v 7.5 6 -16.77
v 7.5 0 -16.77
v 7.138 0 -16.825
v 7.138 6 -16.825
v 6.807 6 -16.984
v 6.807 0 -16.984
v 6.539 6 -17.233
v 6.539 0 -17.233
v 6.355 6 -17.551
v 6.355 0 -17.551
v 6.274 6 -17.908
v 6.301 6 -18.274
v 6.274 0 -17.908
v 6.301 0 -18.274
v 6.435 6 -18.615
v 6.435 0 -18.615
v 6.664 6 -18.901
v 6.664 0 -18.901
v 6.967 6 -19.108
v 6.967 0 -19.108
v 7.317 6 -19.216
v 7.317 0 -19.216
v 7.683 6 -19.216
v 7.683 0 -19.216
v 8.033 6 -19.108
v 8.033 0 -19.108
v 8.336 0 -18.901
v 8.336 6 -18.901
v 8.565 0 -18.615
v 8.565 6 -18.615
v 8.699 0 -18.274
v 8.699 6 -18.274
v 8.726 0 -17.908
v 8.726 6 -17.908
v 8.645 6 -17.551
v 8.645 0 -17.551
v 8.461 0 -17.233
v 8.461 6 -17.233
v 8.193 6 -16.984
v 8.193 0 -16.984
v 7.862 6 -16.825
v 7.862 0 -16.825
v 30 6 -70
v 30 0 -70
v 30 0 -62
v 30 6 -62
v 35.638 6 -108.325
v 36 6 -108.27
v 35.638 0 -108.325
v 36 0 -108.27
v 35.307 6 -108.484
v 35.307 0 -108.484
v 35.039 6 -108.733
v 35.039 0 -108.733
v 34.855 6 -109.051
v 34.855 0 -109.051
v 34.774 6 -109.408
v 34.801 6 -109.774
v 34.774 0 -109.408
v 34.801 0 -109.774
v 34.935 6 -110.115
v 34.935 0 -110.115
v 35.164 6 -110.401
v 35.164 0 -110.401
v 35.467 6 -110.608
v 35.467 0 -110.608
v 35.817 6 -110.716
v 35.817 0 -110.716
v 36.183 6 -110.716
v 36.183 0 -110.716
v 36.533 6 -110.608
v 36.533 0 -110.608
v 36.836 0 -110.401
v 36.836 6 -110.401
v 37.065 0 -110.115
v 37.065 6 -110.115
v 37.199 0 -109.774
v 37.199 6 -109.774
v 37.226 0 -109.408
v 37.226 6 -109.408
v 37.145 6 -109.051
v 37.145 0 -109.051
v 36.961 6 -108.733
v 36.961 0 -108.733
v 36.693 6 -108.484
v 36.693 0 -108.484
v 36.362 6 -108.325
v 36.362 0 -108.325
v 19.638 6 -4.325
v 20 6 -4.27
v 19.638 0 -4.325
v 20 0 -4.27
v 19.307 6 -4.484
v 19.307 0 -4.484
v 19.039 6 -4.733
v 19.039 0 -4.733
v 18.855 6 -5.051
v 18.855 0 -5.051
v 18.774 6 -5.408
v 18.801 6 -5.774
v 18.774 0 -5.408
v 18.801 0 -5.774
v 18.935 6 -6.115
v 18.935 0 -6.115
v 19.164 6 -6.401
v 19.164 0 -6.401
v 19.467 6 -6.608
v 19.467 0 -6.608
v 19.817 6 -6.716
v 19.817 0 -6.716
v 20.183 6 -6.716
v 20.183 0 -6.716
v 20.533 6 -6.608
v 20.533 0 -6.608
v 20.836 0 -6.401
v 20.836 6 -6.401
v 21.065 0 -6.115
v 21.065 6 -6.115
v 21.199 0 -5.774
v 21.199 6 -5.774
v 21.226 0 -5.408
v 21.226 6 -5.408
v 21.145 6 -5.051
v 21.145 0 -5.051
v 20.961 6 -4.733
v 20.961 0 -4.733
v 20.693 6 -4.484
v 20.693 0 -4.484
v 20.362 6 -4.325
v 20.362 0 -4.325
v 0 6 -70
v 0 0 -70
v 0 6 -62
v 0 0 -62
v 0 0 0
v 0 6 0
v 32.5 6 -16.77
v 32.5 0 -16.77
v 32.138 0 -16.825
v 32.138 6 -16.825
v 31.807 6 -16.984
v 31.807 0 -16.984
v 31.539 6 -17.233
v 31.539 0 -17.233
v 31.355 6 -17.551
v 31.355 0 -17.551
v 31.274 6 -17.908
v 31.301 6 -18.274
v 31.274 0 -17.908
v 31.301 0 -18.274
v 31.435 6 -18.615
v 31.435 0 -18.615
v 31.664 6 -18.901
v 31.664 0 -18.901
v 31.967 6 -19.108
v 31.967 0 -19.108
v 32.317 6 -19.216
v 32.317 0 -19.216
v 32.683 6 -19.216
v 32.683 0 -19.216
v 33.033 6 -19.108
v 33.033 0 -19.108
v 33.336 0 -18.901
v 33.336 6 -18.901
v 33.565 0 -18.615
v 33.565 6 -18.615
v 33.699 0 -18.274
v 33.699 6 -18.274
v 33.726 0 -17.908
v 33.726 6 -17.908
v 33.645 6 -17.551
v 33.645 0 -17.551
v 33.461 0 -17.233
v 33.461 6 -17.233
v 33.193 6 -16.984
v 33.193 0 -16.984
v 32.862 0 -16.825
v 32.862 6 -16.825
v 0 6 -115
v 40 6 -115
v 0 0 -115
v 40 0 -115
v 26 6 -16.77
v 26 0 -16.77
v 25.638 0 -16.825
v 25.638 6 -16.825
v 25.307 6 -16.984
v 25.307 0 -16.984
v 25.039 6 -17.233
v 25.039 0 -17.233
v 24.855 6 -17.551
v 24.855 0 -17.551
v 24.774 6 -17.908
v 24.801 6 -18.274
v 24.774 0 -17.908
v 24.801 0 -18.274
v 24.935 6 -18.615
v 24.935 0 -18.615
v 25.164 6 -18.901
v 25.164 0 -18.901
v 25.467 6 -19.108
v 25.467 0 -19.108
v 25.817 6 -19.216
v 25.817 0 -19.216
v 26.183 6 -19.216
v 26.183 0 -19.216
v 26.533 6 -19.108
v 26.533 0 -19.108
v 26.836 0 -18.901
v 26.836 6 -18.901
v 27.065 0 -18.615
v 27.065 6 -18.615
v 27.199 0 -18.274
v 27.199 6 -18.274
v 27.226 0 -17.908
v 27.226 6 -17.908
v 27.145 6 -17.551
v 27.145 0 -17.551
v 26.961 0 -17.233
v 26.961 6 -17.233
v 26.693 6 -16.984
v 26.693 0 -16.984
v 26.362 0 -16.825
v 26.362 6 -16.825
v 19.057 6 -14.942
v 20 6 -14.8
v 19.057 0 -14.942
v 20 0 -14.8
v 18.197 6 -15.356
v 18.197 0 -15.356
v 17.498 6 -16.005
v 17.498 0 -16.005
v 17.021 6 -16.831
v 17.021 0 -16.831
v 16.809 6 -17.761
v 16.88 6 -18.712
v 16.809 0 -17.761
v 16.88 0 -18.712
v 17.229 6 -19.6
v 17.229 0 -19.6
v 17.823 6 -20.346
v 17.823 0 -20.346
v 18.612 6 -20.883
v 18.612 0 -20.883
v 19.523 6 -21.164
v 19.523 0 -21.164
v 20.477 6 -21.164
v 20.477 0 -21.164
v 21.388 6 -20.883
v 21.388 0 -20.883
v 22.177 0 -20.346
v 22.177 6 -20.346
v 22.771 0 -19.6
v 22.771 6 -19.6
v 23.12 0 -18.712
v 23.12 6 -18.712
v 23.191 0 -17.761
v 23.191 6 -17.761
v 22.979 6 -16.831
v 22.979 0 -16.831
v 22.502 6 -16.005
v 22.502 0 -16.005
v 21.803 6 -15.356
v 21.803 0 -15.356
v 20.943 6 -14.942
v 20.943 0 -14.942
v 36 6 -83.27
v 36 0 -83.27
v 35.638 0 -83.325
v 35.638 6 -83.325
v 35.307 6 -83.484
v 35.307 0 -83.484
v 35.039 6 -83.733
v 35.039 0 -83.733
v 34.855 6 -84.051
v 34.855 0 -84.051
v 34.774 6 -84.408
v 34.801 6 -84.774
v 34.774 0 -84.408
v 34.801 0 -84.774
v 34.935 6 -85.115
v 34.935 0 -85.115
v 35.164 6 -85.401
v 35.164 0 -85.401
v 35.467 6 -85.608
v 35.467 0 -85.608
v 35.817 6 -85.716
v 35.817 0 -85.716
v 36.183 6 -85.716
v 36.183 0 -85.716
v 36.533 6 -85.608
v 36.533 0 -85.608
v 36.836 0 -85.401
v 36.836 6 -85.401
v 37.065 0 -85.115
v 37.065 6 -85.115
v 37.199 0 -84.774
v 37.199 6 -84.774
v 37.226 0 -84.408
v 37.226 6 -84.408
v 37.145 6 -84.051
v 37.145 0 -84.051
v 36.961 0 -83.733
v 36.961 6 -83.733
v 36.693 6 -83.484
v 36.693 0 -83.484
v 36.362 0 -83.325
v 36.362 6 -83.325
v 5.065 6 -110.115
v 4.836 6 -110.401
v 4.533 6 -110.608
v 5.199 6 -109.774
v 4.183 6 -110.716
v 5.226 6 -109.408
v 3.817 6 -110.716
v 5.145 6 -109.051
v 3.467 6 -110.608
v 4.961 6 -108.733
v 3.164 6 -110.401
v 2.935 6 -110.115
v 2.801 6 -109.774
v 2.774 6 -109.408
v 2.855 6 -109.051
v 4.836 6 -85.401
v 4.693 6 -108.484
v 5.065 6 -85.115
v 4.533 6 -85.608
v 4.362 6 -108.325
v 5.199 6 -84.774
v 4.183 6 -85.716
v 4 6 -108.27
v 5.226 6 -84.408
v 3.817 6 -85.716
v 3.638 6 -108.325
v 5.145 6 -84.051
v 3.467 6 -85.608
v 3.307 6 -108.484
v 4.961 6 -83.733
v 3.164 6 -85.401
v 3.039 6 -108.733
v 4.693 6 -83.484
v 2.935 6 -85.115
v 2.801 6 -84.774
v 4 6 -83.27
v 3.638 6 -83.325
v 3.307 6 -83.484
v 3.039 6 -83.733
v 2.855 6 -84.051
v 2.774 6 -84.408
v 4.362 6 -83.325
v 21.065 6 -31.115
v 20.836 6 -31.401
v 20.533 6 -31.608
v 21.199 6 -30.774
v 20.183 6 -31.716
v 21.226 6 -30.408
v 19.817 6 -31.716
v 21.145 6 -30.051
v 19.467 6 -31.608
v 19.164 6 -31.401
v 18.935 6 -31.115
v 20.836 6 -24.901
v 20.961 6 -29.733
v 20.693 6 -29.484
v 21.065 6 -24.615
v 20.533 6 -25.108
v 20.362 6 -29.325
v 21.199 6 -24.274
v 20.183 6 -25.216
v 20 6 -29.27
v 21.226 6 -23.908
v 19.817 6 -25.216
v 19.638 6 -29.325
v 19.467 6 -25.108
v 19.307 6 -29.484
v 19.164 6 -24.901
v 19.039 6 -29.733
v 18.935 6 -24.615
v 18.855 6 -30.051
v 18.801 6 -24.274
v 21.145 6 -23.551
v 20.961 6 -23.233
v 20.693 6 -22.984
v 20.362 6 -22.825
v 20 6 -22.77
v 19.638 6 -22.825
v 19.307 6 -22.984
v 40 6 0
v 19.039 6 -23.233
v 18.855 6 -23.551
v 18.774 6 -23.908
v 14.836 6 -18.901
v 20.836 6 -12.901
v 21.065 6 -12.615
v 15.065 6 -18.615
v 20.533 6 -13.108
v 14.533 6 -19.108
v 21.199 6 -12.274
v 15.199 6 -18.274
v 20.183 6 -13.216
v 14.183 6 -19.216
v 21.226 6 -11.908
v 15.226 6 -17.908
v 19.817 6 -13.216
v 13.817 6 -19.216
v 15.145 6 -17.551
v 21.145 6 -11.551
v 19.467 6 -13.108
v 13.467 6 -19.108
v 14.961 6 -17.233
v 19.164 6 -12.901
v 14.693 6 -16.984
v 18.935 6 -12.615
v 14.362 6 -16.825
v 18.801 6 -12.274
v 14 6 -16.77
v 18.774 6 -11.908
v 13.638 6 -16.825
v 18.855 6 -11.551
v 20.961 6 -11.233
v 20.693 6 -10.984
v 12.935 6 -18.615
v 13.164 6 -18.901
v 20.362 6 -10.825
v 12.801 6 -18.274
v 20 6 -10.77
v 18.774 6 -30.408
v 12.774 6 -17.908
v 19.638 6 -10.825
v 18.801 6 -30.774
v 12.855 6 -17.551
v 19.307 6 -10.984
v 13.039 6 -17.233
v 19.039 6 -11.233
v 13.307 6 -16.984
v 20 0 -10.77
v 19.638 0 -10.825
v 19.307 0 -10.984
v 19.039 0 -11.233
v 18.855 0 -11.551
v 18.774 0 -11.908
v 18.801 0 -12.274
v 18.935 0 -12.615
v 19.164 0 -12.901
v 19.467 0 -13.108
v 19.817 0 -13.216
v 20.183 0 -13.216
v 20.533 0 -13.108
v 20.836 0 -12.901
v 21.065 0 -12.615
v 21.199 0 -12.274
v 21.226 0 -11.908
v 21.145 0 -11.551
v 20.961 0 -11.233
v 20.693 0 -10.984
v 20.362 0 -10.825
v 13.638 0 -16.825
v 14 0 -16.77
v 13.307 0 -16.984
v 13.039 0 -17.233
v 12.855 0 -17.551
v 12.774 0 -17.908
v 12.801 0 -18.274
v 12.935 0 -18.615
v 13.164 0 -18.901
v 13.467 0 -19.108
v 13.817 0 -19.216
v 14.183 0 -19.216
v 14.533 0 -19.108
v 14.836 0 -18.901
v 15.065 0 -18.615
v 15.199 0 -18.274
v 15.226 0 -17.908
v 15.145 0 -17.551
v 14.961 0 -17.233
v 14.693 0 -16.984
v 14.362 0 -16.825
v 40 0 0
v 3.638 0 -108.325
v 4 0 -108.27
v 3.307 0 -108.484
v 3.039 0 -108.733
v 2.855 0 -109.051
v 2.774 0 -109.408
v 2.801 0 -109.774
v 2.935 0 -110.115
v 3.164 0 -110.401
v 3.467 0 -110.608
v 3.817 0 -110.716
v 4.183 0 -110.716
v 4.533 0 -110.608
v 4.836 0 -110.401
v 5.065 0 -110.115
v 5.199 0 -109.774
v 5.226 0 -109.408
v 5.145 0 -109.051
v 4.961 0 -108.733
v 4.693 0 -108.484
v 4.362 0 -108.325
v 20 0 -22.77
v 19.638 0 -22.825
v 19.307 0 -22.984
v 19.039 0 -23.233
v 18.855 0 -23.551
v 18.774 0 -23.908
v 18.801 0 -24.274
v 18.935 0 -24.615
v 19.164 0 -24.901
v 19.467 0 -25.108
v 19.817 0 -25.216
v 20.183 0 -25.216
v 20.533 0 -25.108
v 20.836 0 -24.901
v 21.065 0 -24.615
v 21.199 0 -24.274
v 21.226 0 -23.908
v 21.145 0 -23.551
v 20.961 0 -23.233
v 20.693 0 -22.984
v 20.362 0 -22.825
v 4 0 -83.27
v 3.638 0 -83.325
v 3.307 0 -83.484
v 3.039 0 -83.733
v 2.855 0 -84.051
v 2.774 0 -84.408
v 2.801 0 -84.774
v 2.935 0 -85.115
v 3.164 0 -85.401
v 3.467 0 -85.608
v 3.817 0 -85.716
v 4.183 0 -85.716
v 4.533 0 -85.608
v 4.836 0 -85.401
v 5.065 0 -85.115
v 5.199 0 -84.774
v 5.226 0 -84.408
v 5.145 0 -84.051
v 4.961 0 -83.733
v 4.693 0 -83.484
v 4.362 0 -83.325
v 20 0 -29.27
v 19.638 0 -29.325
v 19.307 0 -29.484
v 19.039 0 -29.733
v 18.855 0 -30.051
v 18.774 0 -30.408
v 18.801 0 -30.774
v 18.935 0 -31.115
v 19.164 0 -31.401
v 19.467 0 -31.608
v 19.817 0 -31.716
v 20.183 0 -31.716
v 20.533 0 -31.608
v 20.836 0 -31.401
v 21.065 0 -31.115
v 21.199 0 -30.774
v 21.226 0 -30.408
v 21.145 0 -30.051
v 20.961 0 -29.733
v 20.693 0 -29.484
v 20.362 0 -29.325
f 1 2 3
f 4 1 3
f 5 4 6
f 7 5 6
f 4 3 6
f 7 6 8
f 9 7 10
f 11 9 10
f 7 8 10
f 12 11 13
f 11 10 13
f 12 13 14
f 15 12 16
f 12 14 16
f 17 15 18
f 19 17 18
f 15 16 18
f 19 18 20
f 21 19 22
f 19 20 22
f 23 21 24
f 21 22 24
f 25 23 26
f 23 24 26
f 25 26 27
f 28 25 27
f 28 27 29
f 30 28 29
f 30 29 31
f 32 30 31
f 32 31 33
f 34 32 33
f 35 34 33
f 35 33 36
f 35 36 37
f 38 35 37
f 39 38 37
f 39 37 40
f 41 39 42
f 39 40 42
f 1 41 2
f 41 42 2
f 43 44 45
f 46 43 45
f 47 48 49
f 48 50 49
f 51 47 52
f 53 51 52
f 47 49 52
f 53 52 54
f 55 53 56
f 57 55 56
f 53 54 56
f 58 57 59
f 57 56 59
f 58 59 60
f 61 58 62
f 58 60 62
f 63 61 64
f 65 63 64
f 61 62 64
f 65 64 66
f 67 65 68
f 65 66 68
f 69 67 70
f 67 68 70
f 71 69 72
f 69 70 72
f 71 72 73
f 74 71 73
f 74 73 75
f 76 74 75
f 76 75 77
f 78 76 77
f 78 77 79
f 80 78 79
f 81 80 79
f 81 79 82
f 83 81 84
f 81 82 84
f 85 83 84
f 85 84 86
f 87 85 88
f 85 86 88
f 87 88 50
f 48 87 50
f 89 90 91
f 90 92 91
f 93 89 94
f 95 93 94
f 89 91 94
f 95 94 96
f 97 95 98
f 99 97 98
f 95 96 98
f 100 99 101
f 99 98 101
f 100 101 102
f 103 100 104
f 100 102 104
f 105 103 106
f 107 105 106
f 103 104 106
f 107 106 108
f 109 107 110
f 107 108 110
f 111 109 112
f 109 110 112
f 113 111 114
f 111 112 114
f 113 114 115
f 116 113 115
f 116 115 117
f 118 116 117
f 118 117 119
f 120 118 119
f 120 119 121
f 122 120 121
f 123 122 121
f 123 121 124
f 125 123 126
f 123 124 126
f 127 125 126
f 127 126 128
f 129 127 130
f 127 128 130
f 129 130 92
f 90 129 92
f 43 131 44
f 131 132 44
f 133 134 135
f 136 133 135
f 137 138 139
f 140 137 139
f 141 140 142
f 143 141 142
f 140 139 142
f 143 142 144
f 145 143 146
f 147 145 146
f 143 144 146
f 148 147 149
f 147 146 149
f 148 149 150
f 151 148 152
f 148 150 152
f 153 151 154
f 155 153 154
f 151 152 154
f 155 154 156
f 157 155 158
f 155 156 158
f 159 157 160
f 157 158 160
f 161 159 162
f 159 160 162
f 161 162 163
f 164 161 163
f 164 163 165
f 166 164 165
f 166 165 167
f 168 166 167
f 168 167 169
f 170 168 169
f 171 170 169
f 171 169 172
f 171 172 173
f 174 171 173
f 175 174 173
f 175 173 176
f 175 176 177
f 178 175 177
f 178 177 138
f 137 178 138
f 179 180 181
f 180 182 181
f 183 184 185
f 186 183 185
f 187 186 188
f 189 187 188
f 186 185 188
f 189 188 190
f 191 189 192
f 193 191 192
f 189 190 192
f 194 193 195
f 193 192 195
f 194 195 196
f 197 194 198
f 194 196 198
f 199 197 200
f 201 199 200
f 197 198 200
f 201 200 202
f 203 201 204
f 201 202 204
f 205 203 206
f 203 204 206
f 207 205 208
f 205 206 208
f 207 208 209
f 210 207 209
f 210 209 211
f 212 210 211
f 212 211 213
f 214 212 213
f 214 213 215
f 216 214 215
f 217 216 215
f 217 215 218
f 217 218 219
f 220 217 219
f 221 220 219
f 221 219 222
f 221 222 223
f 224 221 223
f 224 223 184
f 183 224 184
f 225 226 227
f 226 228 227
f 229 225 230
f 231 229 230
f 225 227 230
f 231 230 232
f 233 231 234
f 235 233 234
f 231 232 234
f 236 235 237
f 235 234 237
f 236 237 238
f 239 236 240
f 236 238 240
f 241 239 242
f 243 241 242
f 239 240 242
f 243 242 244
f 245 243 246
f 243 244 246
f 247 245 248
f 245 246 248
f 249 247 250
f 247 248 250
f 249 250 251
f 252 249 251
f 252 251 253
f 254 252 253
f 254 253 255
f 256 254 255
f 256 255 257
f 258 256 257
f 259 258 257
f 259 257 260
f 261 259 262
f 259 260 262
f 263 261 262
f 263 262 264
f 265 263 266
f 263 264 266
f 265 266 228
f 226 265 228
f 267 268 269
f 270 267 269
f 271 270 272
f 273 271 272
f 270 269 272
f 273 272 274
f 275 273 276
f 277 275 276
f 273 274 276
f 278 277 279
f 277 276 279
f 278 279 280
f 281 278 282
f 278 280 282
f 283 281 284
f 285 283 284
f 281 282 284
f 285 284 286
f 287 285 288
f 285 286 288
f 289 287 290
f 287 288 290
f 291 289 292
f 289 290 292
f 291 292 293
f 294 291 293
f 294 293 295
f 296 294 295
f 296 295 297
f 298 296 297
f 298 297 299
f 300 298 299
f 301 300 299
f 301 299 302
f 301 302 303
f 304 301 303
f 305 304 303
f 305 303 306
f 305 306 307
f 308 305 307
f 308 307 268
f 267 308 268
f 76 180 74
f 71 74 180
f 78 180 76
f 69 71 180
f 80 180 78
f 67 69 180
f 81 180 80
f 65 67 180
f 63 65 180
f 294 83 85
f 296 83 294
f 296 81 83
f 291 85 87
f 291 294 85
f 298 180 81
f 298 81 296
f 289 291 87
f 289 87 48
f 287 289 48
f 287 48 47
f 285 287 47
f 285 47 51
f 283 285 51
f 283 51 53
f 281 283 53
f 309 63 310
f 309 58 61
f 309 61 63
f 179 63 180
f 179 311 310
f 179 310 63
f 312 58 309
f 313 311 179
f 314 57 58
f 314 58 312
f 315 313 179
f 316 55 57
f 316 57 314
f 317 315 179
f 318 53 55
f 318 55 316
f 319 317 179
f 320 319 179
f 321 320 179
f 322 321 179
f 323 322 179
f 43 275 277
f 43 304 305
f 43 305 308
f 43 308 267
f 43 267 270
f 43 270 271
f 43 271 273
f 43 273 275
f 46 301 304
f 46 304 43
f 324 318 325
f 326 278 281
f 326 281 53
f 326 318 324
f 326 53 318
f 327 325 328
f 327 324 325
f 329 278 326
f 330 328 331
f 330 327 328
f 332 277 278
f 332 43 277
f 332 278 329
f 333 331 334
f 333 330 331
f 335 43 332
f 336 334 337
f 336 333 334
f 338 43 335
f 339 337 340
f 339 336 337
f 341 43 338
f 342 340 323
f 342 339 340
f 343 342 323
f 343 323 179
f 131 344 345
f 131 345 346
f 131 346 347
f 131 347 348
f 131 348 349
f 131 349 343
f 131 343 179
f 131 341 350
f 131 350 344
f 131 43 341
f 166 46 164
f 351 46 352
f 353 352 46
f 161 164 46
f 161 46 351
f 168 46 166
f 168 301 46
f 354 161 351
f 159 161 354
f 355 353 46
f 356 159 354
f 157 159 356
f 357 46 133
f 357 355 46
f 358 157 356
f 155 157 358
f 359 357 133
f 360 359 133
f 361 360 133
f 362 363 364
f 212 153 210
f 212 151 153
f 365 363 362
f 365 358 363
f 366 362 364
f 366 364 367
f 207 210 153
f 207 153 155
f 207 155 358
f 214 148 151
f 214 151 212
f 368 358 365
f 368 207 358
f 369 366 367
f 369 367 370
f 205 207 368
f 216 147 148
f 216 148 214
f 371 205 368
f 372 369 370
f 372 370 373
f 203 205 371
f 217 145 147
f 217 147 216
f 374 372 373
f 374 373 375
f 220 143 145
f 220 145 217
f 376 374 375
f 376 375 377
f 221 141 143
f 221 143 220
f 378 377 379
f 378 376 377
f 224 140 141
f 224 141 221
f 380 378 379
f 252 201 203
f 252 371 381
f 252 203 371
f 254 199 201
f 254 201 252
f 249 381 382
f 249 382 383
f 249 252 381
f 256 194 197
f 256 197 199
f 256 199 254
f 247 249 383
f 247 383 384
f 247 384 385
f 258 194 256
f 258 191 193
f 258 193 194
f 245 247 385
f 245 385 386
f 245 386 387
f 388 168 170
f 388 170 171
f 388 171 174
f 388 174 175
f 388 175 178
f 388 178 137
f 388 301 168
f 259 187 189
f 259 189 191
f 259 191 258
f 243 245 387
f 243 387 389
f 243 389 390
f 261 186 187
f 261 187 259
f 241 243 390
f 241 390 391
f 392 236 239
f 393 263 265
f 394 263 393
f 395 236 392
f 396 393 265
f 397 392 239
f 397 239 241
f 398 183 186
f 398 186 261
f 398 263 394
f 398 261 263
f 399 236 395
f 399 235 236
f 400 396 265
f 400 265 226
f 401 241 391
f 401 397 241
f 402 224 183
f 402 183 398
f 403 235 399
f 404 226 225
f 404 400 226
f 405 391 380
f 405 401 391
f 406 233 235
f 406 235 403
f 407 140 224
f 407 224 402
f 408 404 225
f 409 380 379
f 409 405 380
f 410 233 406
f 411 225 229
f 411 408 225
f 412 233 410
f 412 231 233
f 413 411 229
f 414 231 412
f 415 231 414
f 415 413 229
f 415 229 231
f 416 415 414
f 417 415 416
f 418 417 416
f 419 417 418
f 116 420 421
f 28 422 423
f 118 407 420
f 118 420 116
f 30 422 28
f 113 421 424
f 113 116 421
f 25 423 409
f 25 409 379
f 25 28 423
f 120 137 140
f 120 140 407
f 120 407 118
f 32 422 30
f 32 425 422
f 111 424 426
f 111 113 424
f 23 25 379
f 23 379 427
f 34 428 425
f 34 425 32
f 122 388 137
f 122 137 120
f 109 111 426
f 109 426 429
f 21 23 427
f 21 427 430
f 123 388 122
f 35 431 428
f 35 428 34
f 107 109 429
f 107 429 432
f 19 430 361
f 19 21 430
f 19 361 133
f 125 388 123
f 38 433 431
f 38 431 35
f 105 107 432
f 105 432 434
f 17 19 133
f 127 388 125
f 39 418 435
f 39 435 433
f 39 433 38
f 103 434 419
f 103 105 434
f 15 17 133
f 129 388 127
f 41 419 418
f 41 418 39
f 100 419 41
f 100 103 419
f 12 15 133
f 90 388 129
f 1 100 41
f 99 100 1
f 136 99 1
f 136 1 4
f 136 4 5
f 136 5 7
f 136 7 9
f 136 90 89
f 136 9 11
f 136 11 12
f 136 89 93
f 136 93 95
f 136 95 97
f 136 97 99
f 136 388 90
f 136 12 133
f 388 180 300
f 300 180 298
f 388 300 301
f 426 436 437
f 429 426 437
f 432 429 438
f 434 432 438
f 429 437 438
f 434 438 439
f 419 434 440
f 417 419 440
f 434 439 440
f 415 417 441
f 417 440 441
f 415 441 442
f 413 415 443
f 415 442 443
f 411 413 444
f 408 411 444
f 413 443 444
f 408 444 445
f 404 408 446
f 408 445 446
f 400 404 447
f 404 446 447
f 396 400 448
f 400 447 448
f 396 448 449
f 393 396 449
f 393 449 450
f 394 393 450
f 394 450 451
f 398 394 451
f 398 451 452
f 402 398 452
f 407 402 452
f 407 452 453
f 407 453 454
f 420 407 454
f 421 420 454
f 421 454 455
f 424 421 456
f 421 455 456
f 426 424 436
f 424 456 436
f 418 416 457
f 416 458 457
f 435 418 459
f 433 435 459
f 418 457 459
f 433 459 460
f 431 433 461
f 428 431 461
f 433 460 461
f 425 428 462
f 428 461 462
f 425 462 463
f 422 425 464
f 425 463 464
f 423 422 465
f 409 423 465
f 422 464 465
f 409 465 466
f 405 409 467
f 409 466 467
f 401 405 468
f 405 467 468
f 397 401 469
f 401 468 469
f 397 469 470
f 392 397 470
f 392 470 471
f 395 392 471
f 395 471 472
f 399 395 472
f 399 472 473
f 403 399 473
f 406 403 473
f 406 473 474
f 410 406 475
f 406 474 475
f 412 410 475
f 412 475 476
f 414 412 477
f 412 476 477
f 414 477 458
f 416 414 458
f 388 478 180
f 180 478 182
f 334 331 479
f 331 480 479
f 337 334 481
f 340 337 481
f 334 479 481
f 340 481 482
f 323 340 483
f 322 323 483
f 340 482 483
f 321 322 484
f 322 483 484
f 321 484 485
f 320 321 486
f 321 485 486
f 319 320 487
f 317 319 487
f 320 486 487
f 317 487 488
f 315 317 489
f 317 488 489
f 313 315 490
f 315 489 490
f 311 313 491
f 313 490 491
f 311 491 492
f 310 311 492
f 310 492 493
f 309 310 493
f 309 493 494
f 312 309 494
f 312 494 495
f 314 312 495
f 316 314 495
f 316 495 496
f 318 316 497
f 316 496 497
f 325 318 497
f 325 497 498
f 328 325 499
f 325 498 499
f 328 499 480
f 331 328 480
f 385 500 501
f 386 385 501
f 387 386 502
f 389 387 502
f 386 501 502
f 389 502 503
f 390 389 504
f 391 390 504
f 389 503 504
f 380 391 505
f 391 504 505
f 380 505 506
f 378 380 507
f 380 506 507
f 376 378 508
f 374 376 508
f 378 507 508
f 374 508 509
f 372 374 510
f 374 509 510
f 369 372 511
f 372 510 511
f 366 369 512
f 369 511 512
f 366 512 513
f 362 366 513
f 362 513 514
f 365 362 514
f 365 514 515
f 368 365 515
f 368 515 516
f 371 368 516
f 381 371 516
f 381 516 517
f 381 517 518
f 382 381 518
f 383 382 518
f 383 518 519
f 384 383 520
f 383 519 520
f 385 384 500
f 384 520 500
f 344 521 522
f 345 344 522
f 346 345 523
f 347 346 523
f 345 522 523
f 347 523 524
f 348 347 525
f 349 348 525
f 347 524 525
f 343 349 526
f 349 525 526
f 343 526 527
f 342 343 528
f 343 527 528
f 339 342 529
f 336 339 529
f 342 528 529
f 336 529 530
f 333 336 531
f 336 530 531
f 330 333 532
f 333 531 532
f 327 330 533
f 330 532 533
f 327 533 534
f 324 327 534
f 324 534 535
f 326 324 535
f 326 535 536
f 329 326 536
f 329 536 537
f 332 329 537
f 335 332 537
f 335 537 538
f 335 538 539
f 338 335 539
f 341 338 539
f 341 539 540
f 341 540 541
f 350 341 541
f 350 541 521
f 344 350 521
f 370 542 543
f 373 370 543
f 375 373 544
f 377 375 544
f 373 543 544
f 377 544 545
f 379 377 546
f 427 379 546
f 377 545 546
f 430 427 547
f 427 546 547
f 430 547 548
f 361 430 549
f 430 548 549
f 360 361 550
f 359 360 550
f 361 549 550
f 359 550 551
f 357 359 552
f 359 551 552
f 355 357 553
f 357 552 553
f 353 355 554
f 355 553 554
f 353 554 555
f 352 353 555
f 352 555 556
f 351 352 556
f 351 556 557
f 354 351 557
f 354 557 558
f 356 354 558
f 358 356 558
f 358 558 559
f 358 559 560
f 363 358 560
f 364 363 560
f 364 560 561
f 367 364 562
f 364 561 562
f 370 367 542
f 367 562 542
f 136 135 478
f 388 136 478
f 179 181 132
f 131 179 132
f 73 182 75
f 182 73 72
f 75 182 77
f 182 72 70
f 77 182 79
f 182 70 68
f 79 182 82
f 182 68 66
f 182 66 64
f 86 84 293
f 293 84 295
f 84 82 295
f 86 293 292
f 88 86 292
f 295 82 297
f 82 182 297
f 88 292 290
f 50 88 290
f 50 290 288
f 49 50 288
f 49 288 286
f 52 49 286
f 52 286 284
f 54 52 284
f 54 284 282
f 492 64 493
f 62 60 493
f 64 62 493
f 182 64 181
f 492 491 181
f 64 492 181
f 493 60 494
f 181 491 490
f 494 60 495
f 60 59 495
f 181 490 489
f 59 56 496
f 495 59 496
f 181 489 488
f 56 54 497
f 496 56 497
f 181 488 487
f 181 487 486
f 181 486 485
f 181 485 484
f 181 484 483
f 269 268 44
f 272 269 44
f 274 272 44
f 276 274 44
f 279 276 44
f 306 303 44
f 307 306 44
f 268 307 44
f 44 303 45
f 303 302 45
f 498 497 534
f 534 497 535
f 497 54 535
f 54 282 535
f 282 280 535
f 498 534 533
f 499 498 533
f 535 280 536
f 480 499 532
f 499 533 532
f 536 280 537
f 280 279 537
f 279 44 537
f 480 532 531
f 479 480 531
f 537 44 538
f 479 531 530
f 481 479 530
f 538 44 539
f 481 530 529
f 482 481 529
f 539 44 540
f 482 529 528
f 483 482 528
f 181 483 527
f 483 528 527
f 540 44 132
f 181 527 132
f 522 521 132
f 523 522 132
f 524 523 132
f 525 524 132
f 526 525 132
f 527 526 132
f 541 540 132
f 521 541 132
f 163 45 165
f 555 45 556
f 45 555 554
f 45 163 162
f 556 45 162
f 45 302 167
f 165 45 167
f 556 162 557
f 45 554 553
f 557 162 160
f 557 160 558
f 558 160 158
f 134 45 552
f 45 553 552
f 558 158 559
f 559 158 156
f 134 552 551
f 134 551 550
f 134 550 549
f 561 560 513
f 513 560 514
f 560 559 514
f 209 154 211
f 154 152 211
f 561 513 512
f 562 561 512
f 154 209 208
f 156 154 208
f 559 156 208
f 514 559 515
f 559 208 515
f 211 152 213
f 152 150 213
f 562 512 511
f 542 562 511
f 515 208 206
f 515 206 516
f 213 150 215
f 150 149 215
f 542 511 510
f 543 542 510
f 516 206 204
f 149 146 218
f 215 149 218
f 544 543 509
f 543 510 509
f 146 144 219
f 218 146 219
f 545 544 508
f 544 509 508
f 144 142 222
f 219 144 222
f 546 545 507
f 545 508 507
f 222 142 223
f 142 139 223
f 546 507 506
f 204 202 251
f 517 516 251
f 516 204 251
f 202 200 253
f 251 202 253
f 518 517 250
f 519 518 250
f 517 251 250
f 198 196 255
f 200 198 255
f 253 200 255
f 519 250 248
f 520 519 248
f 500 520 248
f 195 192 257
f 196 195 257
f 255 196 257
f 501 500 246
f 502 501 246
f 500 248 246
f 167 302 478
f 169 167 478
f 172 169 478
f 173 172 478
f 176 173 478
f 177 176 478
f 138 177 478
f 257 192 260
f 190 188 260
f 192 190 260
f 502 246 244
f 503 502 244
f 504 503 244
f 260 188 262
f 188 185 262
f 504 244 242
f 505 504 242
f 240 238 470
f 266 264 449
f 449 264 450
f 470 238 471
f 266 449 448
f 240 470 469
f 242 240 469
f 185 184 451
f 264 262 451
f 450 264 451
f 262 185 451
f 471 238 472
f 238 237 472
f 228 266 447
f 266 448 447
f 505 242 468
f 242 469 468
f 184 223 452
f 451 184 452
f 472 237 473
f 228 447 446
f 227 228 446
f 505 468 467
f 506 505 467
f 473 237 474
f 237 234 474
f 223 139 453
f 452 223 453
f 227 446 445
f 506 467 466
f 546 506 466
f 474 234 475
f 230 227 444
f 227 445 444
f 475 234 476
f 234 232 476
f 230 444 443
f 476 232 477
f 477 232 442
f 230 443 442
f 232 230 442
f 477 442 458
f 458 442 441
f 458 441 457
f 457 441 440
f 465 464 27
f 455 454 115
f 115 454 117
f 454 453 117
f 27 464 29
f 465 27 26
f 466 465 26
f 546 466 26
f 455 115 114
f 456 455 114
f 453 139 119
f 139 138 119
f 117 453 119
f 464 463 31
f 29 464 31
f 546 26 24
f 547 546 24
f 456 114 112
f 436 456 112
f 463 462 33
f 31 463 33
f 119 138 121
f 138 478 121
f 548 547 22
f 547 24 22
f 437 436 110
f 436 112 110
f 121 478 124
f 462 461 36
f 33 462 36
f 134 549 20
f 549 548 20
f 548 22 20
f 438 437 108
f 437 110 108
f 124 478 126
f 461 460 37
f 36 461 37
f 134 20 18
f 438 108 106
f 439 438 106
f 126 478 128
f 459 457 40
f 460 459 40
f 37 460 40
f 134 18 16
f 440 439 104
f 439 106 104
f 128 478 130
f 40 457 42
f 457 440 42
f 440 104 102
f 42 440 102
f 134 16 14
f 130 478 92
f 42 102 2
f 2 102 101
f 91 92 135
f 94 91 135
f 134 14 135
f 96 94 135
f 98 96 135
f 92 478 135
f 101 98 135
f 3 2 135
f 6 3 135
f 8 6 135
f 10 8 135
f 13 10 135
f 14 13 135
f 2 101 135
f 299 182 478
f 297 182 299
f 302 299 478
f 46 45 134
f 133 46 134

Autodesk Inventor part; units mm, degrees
ref_plane "YZ Plane" through (0, 0, 0) normal (1, 0, 0) x (0, 1, 0)
ref_plane "XZ Plane" through (0, 0, 0) normal (0, 1, 0) x (-1, 0, 0)
ref_plane "XY Plane" through (0, 0, 0) normal (0, 0, 1) x (1, 0, 0)
sketch "スケッチ1" plane through (0, 0, 0) normal (0, 1, 0) x (-1, 0, 0)
  line L0 (0, 0) -> (-40, 0)
  line L1 (-40, 0) -> (-40, -115)
  line L2 (-40, -115) -> (0, -115)
  line L3 (0, -115) -> (0, 0)
  dimension "d0" = 40
  dimension "d1" = 115
extrude "押し出し1" add sketch "スケッチ1" along normal blind 6
sketch "スケッチ2" plane through (0, 6, 0) normal (0, 1, 0) x (1, 0, 0)
  line L0 (0, 0) -> (40, 0) construction
  line L1 (20, 0) -> (20, 115) construction
  line L2 (40, 115) -> (0, 115) construction
  point P0 (20, 18)
  dimension "d4" = 18
hole "穴1" at (20, 6, -18) direction (0, -1, 0) diameter 6.4 end through all
sketch "スケッチ3" plane through (0, 6, 0) normal (0, 1, 0) x (1, 0, 0)
  circle A0 centre (20, 18) radius 3.2 construction
  circle A1 centre (20, 18) radius 12.5 construction
  point P0 (0, 0)
  point P1 (7.5, 18)
  point P2 (20, 5.5)
  point P3 (32.5, 18)
  point P4 (20, 30.5)
  dimension "d12" = 25
  dimension "d15" = 360
hole "穴2" at (7.5, 6, -18) at (20, 6, -5.5) at (32.5, 6, -18) at (20, 6, -30.5) direction (0, -1, 0) diameter 2.459 end through all thread size "M3x0.5" class "6H" standard "ISO Metric profile"
sketch "スケッチ4" plane through (0, 6, 0) normal (0, 1, 0) x (1, 0, 0)
  line L0 (40, 115) -> (0, 115) construction
  line L1 (0, 115) -> (40, 115) construction
  line L2 (40, 115) -> (40, 110) construction
  line L3 (40, 110) -> (0, 110) construction
  line L4 (0, 110) -> (0, 115) construction
  line L5 (0, 115) -> (0, 0) projected
  line L6 (0, 112.5) -> (40, 112.5) construction
  line L7 (40, 0) -> (40, 115) projected
  line L8 (0, 115) -> (0, 0) construction
  line L9 (40, 85) -> (0, 85) construction
  line L10 (0, 85) -> (0, 90) construction
  line L11 (0, 90) -> (40, 90) construction
  line L12 (40, 90) -> (40, 85) construction
  line L13 (40, 87.5) -> (0, 87.5) construction
  point P0 (4, 112.5)
  point P1 (36, 112.5)
  point P2 (36, 87.5)
  point P3 (4, 87.5)
  dimension "d25" = 5
  dimension "d26" = 4
  dimension "d27" = 4
  dimension "d35" = 5
  dimension "d36" = 25
hole "穴3" [suppressed]
sketch "スケッチ5" plane through (0, 0, 0) normal (0, -1, 0) x (1, 0, 0)
  line L0 (30, -62) -> (0, -62)
  line L1 (0, -62) -> (0, -70)
  line L2 (0, -70) -> (30, -70)
  line L3 (30, -70) -> (30, -62)
  line L4 (0, 0) -> (40, 0) projected
  dimension "d37" = 8
  dimension "d38" = 62
  dimension "d39" = 30
extrude "押し出し2" cut sketch "スケッチ5" against normal blind 10
sketch "スケッチ6" plane through (0, 6, 0) normal (0, 1, 0) x (1, 0, 0)
  line L0 (36, 84.5) -> (4, 84.5) construction
  line L1 (4, 84.5) -> (4, 109.5) construction
  line L2 (4, 109.5) -> (36, 109.5) construction
  line L3 (36, 109.5) -> (36, 84.5) construction
  line L4 (40, 0) -> (40, 115) construction
  line L5 (0, 115) -> (0, 70) construction
  line L6 (40, 115) -> (0, 115) construction
  point P0 (0, 0)
  point P1 (20, 109.5)
  dimension "d42" = 4
  dimension "d43" = 4
  dimension "d44" = 5.5
  dimension "d45" = 25
hole "穴4" at (36, 6, -84.5) at (36, 6, -109.5) at (4, 6, -109.5) at (4, 6, -84.5) direction (0, -1, 0) diameter 2.459 end through all thread size "M3x0.5" class "6H" standard "ISO Metric profile"
sketch "スケッチ7" plane through (0, 6, 0) normal (0, 1, 0) x (1, 0, 0)
  circle A0 centre (20, 18) radius 3.2 projected
  circle A1 centre (20, 18) radius 6
  point P0 (0, 0)
  point P1 (20, 12)
  point P2 (14, 18)
  point P3 (20, 24)
  point P4 (26, 18)
  dimension "d53" = 12
hole "穴5" at (20, 6, -12) at (14, 6, -18) at (20, 6, -24) at (26, 6, -18) direction (0, -1, 0) diameter 2.459 end through all thread size "M3x0.5" class "6H" standard "ISO Metric profile"
properties part number "shoulder1_lower_cover" material "アルミニウム 5052"
